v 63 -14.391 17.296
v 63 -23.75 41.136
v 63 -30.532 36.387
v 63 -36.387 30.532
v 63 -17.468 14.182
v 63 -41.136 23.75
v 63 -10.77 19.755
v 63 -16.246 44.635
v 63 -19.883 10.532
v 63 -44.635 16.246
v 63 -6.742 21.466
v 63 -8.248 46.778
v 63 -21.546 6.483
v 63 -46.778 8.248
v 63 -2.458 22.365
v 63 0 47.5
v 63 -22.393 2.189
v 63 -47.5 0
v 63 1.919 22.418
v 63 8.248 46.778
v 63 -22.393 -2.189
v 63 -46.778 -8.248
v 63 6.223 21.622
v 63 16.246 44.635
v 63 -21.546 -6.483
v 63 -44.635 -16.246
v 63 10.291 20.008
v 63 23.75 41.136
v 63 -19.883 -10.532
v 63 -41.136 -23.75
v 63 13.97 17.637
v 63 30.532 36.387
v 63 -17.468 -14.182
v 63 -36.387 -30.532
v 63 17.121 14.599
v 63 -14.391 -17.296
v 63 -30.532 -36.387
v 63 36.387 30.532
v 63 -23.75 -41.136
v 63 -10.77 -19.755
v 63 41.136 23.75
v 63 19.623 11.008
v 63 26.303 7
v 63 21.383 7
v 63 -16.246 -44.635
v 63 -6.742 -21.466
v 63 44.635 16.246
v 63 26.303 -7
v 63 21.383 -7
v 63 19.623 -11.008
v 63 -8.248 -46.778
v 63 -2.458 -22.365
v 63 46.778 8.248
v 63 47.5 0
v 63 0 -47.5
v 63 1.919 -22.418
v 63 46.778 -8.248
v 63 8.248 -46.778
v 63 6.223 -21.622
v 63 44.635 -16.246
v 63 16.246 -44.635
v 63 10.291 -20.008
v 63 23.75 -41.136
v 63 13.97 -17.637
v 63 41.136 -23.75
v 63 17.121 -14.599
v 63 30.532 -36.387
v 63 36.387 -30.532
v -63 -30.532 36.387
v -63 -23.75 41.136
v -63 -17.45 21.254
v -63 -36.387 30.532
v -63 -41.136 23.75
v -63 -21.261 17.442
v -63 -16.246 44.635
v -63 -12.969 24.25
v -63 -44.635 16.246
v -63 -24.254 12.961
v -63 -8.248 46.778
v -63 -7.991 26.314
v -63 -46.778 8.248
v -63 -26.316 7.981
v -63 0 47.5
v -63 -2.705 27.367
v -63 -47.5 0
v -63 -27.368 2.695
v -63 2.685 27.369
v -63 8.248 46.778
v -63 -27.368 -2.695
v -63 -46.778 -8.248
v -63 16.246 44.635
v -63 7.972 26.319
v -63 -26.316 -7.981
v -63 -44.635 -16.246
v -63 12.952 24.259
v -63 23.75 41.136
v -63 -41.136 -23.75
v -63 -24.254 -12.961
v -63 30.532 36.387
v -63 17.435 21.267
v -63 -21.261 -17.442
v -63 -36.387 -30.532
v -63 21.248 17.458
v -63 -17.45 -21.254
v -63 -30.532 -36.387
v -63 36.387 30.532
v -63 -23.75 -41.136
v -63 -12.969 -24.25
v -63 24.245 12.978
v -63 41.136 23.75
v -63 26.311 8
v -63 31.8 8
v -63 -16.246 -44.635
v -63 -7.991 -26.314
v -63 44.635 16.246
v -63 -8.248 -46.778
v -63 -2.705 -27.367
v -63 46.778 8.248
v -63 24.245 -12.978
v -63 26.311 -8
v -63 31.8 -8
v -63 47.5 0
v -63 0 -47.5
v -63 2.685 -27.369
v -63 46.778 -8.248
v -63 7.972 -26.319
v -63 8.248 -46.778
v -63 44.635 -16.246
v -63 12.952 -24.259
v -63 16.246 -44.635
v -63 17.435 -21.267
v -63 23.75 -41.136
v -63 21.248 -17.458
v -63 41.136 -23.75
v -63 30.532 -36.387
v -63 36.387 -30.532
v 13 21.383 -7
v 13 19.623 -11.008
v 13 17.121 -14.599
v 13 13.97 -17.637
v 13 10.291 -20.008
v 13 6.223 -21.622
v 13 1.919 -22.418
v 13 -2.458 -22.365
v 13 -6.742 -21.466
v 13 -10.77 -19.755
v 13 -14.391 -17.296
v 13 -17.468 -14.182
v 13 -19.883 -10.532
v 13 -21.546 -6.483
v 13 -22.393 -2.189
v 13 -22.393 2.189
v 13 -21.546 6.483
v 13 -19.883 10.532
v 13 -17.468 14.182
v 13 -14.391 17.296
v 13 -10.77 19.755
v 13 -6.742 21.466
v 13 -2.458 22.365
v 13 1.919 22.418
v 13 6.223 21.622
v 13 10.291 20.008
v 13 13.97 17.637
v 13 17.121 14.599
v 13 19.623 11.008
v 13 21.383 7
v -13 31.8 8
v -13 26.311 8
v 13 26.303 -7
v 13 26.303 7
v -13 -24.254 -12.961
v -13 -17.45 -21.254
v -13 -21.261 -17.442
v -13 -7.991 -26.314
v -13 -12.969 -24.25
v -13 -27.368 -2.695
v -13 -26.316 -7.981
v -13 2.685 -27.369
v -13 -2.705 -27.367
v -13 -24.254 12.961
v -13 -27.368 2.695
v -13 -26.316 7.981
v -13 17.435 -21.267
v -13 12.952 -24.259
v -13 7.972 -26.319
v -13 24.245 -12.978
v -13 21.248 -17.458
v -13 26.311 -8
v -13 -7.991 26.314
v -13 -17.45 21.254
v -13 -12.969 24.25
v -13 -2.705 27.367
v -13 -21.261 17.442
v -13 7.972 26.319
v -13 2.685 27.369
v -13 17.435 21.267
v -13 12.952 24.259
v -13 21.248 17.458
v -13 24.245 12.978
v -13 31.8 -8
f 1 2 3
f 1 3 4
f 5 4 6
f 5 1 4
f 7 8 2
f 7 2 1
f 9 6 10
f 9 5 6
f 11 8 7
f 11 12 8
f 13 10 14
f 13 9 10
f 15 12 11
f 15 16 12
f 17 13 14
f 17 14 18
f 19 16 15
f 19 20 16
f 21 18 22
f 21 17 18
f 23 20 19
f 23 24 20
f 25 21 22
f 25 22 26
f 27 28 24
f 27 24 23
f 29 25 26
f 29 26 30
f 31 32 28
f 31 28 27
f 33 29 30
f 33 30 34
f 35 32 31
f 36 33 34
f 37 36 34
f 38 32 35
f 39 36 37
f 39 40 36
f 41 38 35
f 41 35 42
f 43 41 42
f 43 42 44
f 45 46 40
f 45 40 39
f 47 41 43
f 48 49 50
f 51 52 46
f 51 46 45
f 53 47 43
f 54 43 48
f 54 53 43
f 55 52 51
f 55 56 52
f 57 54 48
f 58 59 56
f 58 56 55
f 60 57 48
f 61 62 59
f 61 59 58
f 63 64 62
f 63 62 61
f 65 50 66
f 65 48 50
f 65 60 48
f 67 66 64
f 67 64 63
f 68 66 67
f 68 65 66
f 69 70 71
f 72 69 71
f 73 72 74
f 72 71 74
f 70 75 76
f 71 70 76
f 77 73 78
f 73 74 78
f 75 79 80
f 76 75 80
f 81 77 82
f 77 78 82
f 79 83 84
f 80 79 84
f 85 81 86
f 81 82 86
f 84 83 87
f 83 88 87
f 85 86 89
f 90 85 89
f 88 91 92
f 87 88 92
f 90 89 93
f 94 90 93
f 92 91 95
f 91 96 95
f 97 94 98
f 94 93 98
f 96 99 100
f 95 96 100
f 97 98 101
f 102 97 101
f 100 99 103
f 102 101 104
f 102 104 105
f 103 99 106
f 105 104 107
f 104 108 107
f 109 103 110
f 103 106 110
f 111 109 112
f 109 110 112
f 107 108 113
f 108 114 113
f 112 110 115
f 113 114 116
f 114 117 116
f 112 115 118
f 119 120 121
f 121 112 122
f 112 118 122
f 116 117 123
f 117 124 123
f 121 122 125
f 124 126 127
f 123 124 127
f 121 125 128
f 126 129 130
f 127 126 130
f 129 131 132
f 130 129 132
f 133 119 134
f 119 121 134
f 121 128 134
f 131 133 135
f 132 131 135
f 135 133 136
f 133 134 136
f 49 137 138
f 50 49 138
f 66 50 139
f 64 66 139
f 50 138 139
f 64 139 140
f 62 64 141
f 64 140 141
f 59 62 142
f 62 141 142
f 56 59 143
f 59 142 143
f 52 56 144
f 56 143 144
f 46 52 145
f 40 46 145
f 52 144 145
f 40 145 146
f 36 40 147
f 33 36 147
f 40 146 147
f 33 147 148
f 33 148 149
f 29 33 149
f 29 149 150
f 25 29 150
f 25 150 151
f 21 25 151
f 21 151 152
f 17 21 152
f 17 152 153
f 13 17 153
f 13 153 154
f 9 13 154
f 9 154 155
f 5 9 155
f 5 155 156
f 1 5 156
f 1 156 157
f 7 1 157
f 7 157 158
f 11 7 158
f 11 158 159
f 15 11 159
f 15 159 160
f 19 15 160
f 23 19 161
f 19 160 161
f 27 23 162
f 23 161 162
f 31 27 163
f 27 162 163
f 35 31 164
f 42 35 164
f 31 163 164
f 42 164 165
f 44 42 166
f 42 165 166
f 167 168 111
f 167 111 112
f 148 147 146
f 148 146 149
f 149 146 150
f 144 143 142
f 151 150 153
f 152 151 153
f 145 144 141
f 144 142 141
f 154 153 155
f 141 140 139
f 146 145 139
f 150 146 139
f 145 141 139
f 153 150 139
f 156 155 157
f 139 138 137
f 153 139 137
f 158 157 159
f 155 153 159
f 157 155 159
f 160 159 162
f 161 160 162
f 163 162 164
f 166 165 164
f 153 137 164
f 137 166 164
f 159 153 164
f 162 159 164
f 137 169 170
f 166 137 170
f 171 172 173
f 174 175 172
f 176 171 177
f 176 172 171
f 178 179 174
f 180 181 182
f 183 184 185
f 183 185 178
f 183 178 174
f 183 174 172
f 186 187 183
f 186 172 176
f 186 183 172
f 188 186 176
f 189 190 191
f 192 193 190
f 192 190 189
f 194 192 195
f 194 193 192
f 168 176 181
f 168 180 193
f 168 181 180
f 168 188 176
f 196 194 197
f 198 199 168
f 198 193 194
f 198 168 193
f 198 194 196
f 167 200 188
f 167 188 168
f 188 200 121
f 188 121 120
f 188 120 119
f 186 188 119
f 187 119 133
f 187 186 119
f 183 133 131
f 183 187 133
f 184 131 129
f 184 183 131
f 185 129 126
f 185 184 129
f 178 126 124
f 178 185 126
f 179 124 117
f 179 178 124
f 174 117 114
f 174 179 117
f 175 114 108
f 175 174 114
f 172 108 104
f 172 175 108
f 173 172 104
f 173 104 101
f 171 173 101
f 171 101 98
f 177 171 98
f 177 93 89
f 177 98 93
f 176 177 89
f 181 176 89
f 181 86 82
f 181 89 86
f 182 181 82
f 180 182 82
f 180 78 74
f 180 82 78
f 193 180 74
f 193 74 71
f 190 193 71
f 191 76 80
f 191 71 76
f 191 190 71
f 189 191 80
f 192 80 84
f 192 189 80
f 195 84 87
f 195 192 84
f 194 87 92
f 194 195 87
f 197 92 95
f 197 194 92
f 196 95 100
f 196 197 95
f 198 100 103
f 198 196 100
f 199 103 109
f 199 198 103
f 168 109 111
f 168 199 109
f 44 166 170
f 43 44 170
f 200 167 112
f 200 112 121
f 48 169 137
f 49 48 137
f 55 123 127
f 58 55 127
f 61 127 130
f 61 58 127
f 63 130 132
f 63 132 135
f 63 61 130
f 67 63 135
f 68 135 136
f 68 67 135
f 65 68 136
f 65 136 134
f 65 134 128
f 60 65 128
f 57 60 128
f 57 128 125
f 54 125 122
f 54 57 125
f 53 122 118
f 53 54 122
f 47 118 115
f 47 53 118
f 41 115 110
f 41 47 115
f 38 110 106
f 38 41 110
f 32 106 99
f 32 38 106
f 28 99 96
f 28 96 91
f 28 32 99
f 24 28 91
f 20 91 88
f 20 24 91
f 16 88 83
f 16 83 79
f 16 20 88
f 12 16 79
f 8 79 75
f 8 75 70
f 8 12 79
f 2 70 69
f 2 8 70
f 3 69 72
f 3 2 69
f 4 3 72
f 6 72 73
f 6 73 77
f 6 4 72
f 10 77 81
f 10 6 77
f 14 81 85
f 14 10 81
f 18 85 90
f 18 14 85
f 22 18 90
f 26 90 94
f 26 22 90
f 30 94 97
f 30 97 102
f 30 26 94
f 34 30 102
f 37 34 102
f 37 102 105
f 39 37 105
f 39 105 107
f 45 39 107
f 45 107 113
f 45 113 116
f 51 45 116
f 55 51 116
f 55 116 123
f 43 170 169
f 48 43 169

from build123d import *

# Parameters (mm, degrees)
SKETCH_1_R          = 47.5
EXTRUDE_1_DEPTH     = 63
CUT_EXTRUDE_1_DEPTH = 102.432243394
CUT_EXTRUDE_2_DEPTH = 102.432243394


with BuildPart() as part:
    # Эскиз1 → Бобышка-Вытянуть1 (new, symmetric)
    with BuildSketch(Plane(origin=(0, 0, 0), x_dir=(0, 0, -1), z_dir=(1, 0, 0))):
        Circle(SKETCH_1_R)
    extrude(amount=EXTRUDE_1_DEPTH, both=True)

    # Эскиз2 → Вырез-Вытянуть1 (cut, through all)
    with BuildSketch(Plane(origin=(-13, 0, 0), x_dir=(0, 0, -1), z_dir=(1, 0, 0))):
        with BuildLine():
            Line((-8, 31.8), (8, 31.8))
            Line((8, 31.8), (8, 26.310644234))
            ThreePointArc((8, 26.310644234), (0, -27.5), (-8, 26.310644234))
            Line((-8, 26.310644234), (-8, 31.8))
        make_face()
    extrude(amount=-CUT_EXTRUDE_1_DEPTH, mode=Mode.SUBTRACT)

    # Эскиз3 → Вырез-Вытянуть2 (cut, through all)
    with BuildSketch(Plane(origin=(13, 0, 0), x_dir=(0, 0, -1), z_dir=(1, 0, 0))):
        with BuildLine():
            Line((-7, 26.30340478), (7, 26.30340478))
            Line((7, 26.30340478), (7, 21.38340478))
            ThreePointArc((7, 21.38340478), (0, -22.5), (-7, 21.38340478))
            Line((-7, 21.38340478), (-7, 26.30340478))
        make_face()
    extrude(amount=CUT_EXTRUDE_2_DEPTH, mode=Mode.SUBTRACT)


solid = part.part
